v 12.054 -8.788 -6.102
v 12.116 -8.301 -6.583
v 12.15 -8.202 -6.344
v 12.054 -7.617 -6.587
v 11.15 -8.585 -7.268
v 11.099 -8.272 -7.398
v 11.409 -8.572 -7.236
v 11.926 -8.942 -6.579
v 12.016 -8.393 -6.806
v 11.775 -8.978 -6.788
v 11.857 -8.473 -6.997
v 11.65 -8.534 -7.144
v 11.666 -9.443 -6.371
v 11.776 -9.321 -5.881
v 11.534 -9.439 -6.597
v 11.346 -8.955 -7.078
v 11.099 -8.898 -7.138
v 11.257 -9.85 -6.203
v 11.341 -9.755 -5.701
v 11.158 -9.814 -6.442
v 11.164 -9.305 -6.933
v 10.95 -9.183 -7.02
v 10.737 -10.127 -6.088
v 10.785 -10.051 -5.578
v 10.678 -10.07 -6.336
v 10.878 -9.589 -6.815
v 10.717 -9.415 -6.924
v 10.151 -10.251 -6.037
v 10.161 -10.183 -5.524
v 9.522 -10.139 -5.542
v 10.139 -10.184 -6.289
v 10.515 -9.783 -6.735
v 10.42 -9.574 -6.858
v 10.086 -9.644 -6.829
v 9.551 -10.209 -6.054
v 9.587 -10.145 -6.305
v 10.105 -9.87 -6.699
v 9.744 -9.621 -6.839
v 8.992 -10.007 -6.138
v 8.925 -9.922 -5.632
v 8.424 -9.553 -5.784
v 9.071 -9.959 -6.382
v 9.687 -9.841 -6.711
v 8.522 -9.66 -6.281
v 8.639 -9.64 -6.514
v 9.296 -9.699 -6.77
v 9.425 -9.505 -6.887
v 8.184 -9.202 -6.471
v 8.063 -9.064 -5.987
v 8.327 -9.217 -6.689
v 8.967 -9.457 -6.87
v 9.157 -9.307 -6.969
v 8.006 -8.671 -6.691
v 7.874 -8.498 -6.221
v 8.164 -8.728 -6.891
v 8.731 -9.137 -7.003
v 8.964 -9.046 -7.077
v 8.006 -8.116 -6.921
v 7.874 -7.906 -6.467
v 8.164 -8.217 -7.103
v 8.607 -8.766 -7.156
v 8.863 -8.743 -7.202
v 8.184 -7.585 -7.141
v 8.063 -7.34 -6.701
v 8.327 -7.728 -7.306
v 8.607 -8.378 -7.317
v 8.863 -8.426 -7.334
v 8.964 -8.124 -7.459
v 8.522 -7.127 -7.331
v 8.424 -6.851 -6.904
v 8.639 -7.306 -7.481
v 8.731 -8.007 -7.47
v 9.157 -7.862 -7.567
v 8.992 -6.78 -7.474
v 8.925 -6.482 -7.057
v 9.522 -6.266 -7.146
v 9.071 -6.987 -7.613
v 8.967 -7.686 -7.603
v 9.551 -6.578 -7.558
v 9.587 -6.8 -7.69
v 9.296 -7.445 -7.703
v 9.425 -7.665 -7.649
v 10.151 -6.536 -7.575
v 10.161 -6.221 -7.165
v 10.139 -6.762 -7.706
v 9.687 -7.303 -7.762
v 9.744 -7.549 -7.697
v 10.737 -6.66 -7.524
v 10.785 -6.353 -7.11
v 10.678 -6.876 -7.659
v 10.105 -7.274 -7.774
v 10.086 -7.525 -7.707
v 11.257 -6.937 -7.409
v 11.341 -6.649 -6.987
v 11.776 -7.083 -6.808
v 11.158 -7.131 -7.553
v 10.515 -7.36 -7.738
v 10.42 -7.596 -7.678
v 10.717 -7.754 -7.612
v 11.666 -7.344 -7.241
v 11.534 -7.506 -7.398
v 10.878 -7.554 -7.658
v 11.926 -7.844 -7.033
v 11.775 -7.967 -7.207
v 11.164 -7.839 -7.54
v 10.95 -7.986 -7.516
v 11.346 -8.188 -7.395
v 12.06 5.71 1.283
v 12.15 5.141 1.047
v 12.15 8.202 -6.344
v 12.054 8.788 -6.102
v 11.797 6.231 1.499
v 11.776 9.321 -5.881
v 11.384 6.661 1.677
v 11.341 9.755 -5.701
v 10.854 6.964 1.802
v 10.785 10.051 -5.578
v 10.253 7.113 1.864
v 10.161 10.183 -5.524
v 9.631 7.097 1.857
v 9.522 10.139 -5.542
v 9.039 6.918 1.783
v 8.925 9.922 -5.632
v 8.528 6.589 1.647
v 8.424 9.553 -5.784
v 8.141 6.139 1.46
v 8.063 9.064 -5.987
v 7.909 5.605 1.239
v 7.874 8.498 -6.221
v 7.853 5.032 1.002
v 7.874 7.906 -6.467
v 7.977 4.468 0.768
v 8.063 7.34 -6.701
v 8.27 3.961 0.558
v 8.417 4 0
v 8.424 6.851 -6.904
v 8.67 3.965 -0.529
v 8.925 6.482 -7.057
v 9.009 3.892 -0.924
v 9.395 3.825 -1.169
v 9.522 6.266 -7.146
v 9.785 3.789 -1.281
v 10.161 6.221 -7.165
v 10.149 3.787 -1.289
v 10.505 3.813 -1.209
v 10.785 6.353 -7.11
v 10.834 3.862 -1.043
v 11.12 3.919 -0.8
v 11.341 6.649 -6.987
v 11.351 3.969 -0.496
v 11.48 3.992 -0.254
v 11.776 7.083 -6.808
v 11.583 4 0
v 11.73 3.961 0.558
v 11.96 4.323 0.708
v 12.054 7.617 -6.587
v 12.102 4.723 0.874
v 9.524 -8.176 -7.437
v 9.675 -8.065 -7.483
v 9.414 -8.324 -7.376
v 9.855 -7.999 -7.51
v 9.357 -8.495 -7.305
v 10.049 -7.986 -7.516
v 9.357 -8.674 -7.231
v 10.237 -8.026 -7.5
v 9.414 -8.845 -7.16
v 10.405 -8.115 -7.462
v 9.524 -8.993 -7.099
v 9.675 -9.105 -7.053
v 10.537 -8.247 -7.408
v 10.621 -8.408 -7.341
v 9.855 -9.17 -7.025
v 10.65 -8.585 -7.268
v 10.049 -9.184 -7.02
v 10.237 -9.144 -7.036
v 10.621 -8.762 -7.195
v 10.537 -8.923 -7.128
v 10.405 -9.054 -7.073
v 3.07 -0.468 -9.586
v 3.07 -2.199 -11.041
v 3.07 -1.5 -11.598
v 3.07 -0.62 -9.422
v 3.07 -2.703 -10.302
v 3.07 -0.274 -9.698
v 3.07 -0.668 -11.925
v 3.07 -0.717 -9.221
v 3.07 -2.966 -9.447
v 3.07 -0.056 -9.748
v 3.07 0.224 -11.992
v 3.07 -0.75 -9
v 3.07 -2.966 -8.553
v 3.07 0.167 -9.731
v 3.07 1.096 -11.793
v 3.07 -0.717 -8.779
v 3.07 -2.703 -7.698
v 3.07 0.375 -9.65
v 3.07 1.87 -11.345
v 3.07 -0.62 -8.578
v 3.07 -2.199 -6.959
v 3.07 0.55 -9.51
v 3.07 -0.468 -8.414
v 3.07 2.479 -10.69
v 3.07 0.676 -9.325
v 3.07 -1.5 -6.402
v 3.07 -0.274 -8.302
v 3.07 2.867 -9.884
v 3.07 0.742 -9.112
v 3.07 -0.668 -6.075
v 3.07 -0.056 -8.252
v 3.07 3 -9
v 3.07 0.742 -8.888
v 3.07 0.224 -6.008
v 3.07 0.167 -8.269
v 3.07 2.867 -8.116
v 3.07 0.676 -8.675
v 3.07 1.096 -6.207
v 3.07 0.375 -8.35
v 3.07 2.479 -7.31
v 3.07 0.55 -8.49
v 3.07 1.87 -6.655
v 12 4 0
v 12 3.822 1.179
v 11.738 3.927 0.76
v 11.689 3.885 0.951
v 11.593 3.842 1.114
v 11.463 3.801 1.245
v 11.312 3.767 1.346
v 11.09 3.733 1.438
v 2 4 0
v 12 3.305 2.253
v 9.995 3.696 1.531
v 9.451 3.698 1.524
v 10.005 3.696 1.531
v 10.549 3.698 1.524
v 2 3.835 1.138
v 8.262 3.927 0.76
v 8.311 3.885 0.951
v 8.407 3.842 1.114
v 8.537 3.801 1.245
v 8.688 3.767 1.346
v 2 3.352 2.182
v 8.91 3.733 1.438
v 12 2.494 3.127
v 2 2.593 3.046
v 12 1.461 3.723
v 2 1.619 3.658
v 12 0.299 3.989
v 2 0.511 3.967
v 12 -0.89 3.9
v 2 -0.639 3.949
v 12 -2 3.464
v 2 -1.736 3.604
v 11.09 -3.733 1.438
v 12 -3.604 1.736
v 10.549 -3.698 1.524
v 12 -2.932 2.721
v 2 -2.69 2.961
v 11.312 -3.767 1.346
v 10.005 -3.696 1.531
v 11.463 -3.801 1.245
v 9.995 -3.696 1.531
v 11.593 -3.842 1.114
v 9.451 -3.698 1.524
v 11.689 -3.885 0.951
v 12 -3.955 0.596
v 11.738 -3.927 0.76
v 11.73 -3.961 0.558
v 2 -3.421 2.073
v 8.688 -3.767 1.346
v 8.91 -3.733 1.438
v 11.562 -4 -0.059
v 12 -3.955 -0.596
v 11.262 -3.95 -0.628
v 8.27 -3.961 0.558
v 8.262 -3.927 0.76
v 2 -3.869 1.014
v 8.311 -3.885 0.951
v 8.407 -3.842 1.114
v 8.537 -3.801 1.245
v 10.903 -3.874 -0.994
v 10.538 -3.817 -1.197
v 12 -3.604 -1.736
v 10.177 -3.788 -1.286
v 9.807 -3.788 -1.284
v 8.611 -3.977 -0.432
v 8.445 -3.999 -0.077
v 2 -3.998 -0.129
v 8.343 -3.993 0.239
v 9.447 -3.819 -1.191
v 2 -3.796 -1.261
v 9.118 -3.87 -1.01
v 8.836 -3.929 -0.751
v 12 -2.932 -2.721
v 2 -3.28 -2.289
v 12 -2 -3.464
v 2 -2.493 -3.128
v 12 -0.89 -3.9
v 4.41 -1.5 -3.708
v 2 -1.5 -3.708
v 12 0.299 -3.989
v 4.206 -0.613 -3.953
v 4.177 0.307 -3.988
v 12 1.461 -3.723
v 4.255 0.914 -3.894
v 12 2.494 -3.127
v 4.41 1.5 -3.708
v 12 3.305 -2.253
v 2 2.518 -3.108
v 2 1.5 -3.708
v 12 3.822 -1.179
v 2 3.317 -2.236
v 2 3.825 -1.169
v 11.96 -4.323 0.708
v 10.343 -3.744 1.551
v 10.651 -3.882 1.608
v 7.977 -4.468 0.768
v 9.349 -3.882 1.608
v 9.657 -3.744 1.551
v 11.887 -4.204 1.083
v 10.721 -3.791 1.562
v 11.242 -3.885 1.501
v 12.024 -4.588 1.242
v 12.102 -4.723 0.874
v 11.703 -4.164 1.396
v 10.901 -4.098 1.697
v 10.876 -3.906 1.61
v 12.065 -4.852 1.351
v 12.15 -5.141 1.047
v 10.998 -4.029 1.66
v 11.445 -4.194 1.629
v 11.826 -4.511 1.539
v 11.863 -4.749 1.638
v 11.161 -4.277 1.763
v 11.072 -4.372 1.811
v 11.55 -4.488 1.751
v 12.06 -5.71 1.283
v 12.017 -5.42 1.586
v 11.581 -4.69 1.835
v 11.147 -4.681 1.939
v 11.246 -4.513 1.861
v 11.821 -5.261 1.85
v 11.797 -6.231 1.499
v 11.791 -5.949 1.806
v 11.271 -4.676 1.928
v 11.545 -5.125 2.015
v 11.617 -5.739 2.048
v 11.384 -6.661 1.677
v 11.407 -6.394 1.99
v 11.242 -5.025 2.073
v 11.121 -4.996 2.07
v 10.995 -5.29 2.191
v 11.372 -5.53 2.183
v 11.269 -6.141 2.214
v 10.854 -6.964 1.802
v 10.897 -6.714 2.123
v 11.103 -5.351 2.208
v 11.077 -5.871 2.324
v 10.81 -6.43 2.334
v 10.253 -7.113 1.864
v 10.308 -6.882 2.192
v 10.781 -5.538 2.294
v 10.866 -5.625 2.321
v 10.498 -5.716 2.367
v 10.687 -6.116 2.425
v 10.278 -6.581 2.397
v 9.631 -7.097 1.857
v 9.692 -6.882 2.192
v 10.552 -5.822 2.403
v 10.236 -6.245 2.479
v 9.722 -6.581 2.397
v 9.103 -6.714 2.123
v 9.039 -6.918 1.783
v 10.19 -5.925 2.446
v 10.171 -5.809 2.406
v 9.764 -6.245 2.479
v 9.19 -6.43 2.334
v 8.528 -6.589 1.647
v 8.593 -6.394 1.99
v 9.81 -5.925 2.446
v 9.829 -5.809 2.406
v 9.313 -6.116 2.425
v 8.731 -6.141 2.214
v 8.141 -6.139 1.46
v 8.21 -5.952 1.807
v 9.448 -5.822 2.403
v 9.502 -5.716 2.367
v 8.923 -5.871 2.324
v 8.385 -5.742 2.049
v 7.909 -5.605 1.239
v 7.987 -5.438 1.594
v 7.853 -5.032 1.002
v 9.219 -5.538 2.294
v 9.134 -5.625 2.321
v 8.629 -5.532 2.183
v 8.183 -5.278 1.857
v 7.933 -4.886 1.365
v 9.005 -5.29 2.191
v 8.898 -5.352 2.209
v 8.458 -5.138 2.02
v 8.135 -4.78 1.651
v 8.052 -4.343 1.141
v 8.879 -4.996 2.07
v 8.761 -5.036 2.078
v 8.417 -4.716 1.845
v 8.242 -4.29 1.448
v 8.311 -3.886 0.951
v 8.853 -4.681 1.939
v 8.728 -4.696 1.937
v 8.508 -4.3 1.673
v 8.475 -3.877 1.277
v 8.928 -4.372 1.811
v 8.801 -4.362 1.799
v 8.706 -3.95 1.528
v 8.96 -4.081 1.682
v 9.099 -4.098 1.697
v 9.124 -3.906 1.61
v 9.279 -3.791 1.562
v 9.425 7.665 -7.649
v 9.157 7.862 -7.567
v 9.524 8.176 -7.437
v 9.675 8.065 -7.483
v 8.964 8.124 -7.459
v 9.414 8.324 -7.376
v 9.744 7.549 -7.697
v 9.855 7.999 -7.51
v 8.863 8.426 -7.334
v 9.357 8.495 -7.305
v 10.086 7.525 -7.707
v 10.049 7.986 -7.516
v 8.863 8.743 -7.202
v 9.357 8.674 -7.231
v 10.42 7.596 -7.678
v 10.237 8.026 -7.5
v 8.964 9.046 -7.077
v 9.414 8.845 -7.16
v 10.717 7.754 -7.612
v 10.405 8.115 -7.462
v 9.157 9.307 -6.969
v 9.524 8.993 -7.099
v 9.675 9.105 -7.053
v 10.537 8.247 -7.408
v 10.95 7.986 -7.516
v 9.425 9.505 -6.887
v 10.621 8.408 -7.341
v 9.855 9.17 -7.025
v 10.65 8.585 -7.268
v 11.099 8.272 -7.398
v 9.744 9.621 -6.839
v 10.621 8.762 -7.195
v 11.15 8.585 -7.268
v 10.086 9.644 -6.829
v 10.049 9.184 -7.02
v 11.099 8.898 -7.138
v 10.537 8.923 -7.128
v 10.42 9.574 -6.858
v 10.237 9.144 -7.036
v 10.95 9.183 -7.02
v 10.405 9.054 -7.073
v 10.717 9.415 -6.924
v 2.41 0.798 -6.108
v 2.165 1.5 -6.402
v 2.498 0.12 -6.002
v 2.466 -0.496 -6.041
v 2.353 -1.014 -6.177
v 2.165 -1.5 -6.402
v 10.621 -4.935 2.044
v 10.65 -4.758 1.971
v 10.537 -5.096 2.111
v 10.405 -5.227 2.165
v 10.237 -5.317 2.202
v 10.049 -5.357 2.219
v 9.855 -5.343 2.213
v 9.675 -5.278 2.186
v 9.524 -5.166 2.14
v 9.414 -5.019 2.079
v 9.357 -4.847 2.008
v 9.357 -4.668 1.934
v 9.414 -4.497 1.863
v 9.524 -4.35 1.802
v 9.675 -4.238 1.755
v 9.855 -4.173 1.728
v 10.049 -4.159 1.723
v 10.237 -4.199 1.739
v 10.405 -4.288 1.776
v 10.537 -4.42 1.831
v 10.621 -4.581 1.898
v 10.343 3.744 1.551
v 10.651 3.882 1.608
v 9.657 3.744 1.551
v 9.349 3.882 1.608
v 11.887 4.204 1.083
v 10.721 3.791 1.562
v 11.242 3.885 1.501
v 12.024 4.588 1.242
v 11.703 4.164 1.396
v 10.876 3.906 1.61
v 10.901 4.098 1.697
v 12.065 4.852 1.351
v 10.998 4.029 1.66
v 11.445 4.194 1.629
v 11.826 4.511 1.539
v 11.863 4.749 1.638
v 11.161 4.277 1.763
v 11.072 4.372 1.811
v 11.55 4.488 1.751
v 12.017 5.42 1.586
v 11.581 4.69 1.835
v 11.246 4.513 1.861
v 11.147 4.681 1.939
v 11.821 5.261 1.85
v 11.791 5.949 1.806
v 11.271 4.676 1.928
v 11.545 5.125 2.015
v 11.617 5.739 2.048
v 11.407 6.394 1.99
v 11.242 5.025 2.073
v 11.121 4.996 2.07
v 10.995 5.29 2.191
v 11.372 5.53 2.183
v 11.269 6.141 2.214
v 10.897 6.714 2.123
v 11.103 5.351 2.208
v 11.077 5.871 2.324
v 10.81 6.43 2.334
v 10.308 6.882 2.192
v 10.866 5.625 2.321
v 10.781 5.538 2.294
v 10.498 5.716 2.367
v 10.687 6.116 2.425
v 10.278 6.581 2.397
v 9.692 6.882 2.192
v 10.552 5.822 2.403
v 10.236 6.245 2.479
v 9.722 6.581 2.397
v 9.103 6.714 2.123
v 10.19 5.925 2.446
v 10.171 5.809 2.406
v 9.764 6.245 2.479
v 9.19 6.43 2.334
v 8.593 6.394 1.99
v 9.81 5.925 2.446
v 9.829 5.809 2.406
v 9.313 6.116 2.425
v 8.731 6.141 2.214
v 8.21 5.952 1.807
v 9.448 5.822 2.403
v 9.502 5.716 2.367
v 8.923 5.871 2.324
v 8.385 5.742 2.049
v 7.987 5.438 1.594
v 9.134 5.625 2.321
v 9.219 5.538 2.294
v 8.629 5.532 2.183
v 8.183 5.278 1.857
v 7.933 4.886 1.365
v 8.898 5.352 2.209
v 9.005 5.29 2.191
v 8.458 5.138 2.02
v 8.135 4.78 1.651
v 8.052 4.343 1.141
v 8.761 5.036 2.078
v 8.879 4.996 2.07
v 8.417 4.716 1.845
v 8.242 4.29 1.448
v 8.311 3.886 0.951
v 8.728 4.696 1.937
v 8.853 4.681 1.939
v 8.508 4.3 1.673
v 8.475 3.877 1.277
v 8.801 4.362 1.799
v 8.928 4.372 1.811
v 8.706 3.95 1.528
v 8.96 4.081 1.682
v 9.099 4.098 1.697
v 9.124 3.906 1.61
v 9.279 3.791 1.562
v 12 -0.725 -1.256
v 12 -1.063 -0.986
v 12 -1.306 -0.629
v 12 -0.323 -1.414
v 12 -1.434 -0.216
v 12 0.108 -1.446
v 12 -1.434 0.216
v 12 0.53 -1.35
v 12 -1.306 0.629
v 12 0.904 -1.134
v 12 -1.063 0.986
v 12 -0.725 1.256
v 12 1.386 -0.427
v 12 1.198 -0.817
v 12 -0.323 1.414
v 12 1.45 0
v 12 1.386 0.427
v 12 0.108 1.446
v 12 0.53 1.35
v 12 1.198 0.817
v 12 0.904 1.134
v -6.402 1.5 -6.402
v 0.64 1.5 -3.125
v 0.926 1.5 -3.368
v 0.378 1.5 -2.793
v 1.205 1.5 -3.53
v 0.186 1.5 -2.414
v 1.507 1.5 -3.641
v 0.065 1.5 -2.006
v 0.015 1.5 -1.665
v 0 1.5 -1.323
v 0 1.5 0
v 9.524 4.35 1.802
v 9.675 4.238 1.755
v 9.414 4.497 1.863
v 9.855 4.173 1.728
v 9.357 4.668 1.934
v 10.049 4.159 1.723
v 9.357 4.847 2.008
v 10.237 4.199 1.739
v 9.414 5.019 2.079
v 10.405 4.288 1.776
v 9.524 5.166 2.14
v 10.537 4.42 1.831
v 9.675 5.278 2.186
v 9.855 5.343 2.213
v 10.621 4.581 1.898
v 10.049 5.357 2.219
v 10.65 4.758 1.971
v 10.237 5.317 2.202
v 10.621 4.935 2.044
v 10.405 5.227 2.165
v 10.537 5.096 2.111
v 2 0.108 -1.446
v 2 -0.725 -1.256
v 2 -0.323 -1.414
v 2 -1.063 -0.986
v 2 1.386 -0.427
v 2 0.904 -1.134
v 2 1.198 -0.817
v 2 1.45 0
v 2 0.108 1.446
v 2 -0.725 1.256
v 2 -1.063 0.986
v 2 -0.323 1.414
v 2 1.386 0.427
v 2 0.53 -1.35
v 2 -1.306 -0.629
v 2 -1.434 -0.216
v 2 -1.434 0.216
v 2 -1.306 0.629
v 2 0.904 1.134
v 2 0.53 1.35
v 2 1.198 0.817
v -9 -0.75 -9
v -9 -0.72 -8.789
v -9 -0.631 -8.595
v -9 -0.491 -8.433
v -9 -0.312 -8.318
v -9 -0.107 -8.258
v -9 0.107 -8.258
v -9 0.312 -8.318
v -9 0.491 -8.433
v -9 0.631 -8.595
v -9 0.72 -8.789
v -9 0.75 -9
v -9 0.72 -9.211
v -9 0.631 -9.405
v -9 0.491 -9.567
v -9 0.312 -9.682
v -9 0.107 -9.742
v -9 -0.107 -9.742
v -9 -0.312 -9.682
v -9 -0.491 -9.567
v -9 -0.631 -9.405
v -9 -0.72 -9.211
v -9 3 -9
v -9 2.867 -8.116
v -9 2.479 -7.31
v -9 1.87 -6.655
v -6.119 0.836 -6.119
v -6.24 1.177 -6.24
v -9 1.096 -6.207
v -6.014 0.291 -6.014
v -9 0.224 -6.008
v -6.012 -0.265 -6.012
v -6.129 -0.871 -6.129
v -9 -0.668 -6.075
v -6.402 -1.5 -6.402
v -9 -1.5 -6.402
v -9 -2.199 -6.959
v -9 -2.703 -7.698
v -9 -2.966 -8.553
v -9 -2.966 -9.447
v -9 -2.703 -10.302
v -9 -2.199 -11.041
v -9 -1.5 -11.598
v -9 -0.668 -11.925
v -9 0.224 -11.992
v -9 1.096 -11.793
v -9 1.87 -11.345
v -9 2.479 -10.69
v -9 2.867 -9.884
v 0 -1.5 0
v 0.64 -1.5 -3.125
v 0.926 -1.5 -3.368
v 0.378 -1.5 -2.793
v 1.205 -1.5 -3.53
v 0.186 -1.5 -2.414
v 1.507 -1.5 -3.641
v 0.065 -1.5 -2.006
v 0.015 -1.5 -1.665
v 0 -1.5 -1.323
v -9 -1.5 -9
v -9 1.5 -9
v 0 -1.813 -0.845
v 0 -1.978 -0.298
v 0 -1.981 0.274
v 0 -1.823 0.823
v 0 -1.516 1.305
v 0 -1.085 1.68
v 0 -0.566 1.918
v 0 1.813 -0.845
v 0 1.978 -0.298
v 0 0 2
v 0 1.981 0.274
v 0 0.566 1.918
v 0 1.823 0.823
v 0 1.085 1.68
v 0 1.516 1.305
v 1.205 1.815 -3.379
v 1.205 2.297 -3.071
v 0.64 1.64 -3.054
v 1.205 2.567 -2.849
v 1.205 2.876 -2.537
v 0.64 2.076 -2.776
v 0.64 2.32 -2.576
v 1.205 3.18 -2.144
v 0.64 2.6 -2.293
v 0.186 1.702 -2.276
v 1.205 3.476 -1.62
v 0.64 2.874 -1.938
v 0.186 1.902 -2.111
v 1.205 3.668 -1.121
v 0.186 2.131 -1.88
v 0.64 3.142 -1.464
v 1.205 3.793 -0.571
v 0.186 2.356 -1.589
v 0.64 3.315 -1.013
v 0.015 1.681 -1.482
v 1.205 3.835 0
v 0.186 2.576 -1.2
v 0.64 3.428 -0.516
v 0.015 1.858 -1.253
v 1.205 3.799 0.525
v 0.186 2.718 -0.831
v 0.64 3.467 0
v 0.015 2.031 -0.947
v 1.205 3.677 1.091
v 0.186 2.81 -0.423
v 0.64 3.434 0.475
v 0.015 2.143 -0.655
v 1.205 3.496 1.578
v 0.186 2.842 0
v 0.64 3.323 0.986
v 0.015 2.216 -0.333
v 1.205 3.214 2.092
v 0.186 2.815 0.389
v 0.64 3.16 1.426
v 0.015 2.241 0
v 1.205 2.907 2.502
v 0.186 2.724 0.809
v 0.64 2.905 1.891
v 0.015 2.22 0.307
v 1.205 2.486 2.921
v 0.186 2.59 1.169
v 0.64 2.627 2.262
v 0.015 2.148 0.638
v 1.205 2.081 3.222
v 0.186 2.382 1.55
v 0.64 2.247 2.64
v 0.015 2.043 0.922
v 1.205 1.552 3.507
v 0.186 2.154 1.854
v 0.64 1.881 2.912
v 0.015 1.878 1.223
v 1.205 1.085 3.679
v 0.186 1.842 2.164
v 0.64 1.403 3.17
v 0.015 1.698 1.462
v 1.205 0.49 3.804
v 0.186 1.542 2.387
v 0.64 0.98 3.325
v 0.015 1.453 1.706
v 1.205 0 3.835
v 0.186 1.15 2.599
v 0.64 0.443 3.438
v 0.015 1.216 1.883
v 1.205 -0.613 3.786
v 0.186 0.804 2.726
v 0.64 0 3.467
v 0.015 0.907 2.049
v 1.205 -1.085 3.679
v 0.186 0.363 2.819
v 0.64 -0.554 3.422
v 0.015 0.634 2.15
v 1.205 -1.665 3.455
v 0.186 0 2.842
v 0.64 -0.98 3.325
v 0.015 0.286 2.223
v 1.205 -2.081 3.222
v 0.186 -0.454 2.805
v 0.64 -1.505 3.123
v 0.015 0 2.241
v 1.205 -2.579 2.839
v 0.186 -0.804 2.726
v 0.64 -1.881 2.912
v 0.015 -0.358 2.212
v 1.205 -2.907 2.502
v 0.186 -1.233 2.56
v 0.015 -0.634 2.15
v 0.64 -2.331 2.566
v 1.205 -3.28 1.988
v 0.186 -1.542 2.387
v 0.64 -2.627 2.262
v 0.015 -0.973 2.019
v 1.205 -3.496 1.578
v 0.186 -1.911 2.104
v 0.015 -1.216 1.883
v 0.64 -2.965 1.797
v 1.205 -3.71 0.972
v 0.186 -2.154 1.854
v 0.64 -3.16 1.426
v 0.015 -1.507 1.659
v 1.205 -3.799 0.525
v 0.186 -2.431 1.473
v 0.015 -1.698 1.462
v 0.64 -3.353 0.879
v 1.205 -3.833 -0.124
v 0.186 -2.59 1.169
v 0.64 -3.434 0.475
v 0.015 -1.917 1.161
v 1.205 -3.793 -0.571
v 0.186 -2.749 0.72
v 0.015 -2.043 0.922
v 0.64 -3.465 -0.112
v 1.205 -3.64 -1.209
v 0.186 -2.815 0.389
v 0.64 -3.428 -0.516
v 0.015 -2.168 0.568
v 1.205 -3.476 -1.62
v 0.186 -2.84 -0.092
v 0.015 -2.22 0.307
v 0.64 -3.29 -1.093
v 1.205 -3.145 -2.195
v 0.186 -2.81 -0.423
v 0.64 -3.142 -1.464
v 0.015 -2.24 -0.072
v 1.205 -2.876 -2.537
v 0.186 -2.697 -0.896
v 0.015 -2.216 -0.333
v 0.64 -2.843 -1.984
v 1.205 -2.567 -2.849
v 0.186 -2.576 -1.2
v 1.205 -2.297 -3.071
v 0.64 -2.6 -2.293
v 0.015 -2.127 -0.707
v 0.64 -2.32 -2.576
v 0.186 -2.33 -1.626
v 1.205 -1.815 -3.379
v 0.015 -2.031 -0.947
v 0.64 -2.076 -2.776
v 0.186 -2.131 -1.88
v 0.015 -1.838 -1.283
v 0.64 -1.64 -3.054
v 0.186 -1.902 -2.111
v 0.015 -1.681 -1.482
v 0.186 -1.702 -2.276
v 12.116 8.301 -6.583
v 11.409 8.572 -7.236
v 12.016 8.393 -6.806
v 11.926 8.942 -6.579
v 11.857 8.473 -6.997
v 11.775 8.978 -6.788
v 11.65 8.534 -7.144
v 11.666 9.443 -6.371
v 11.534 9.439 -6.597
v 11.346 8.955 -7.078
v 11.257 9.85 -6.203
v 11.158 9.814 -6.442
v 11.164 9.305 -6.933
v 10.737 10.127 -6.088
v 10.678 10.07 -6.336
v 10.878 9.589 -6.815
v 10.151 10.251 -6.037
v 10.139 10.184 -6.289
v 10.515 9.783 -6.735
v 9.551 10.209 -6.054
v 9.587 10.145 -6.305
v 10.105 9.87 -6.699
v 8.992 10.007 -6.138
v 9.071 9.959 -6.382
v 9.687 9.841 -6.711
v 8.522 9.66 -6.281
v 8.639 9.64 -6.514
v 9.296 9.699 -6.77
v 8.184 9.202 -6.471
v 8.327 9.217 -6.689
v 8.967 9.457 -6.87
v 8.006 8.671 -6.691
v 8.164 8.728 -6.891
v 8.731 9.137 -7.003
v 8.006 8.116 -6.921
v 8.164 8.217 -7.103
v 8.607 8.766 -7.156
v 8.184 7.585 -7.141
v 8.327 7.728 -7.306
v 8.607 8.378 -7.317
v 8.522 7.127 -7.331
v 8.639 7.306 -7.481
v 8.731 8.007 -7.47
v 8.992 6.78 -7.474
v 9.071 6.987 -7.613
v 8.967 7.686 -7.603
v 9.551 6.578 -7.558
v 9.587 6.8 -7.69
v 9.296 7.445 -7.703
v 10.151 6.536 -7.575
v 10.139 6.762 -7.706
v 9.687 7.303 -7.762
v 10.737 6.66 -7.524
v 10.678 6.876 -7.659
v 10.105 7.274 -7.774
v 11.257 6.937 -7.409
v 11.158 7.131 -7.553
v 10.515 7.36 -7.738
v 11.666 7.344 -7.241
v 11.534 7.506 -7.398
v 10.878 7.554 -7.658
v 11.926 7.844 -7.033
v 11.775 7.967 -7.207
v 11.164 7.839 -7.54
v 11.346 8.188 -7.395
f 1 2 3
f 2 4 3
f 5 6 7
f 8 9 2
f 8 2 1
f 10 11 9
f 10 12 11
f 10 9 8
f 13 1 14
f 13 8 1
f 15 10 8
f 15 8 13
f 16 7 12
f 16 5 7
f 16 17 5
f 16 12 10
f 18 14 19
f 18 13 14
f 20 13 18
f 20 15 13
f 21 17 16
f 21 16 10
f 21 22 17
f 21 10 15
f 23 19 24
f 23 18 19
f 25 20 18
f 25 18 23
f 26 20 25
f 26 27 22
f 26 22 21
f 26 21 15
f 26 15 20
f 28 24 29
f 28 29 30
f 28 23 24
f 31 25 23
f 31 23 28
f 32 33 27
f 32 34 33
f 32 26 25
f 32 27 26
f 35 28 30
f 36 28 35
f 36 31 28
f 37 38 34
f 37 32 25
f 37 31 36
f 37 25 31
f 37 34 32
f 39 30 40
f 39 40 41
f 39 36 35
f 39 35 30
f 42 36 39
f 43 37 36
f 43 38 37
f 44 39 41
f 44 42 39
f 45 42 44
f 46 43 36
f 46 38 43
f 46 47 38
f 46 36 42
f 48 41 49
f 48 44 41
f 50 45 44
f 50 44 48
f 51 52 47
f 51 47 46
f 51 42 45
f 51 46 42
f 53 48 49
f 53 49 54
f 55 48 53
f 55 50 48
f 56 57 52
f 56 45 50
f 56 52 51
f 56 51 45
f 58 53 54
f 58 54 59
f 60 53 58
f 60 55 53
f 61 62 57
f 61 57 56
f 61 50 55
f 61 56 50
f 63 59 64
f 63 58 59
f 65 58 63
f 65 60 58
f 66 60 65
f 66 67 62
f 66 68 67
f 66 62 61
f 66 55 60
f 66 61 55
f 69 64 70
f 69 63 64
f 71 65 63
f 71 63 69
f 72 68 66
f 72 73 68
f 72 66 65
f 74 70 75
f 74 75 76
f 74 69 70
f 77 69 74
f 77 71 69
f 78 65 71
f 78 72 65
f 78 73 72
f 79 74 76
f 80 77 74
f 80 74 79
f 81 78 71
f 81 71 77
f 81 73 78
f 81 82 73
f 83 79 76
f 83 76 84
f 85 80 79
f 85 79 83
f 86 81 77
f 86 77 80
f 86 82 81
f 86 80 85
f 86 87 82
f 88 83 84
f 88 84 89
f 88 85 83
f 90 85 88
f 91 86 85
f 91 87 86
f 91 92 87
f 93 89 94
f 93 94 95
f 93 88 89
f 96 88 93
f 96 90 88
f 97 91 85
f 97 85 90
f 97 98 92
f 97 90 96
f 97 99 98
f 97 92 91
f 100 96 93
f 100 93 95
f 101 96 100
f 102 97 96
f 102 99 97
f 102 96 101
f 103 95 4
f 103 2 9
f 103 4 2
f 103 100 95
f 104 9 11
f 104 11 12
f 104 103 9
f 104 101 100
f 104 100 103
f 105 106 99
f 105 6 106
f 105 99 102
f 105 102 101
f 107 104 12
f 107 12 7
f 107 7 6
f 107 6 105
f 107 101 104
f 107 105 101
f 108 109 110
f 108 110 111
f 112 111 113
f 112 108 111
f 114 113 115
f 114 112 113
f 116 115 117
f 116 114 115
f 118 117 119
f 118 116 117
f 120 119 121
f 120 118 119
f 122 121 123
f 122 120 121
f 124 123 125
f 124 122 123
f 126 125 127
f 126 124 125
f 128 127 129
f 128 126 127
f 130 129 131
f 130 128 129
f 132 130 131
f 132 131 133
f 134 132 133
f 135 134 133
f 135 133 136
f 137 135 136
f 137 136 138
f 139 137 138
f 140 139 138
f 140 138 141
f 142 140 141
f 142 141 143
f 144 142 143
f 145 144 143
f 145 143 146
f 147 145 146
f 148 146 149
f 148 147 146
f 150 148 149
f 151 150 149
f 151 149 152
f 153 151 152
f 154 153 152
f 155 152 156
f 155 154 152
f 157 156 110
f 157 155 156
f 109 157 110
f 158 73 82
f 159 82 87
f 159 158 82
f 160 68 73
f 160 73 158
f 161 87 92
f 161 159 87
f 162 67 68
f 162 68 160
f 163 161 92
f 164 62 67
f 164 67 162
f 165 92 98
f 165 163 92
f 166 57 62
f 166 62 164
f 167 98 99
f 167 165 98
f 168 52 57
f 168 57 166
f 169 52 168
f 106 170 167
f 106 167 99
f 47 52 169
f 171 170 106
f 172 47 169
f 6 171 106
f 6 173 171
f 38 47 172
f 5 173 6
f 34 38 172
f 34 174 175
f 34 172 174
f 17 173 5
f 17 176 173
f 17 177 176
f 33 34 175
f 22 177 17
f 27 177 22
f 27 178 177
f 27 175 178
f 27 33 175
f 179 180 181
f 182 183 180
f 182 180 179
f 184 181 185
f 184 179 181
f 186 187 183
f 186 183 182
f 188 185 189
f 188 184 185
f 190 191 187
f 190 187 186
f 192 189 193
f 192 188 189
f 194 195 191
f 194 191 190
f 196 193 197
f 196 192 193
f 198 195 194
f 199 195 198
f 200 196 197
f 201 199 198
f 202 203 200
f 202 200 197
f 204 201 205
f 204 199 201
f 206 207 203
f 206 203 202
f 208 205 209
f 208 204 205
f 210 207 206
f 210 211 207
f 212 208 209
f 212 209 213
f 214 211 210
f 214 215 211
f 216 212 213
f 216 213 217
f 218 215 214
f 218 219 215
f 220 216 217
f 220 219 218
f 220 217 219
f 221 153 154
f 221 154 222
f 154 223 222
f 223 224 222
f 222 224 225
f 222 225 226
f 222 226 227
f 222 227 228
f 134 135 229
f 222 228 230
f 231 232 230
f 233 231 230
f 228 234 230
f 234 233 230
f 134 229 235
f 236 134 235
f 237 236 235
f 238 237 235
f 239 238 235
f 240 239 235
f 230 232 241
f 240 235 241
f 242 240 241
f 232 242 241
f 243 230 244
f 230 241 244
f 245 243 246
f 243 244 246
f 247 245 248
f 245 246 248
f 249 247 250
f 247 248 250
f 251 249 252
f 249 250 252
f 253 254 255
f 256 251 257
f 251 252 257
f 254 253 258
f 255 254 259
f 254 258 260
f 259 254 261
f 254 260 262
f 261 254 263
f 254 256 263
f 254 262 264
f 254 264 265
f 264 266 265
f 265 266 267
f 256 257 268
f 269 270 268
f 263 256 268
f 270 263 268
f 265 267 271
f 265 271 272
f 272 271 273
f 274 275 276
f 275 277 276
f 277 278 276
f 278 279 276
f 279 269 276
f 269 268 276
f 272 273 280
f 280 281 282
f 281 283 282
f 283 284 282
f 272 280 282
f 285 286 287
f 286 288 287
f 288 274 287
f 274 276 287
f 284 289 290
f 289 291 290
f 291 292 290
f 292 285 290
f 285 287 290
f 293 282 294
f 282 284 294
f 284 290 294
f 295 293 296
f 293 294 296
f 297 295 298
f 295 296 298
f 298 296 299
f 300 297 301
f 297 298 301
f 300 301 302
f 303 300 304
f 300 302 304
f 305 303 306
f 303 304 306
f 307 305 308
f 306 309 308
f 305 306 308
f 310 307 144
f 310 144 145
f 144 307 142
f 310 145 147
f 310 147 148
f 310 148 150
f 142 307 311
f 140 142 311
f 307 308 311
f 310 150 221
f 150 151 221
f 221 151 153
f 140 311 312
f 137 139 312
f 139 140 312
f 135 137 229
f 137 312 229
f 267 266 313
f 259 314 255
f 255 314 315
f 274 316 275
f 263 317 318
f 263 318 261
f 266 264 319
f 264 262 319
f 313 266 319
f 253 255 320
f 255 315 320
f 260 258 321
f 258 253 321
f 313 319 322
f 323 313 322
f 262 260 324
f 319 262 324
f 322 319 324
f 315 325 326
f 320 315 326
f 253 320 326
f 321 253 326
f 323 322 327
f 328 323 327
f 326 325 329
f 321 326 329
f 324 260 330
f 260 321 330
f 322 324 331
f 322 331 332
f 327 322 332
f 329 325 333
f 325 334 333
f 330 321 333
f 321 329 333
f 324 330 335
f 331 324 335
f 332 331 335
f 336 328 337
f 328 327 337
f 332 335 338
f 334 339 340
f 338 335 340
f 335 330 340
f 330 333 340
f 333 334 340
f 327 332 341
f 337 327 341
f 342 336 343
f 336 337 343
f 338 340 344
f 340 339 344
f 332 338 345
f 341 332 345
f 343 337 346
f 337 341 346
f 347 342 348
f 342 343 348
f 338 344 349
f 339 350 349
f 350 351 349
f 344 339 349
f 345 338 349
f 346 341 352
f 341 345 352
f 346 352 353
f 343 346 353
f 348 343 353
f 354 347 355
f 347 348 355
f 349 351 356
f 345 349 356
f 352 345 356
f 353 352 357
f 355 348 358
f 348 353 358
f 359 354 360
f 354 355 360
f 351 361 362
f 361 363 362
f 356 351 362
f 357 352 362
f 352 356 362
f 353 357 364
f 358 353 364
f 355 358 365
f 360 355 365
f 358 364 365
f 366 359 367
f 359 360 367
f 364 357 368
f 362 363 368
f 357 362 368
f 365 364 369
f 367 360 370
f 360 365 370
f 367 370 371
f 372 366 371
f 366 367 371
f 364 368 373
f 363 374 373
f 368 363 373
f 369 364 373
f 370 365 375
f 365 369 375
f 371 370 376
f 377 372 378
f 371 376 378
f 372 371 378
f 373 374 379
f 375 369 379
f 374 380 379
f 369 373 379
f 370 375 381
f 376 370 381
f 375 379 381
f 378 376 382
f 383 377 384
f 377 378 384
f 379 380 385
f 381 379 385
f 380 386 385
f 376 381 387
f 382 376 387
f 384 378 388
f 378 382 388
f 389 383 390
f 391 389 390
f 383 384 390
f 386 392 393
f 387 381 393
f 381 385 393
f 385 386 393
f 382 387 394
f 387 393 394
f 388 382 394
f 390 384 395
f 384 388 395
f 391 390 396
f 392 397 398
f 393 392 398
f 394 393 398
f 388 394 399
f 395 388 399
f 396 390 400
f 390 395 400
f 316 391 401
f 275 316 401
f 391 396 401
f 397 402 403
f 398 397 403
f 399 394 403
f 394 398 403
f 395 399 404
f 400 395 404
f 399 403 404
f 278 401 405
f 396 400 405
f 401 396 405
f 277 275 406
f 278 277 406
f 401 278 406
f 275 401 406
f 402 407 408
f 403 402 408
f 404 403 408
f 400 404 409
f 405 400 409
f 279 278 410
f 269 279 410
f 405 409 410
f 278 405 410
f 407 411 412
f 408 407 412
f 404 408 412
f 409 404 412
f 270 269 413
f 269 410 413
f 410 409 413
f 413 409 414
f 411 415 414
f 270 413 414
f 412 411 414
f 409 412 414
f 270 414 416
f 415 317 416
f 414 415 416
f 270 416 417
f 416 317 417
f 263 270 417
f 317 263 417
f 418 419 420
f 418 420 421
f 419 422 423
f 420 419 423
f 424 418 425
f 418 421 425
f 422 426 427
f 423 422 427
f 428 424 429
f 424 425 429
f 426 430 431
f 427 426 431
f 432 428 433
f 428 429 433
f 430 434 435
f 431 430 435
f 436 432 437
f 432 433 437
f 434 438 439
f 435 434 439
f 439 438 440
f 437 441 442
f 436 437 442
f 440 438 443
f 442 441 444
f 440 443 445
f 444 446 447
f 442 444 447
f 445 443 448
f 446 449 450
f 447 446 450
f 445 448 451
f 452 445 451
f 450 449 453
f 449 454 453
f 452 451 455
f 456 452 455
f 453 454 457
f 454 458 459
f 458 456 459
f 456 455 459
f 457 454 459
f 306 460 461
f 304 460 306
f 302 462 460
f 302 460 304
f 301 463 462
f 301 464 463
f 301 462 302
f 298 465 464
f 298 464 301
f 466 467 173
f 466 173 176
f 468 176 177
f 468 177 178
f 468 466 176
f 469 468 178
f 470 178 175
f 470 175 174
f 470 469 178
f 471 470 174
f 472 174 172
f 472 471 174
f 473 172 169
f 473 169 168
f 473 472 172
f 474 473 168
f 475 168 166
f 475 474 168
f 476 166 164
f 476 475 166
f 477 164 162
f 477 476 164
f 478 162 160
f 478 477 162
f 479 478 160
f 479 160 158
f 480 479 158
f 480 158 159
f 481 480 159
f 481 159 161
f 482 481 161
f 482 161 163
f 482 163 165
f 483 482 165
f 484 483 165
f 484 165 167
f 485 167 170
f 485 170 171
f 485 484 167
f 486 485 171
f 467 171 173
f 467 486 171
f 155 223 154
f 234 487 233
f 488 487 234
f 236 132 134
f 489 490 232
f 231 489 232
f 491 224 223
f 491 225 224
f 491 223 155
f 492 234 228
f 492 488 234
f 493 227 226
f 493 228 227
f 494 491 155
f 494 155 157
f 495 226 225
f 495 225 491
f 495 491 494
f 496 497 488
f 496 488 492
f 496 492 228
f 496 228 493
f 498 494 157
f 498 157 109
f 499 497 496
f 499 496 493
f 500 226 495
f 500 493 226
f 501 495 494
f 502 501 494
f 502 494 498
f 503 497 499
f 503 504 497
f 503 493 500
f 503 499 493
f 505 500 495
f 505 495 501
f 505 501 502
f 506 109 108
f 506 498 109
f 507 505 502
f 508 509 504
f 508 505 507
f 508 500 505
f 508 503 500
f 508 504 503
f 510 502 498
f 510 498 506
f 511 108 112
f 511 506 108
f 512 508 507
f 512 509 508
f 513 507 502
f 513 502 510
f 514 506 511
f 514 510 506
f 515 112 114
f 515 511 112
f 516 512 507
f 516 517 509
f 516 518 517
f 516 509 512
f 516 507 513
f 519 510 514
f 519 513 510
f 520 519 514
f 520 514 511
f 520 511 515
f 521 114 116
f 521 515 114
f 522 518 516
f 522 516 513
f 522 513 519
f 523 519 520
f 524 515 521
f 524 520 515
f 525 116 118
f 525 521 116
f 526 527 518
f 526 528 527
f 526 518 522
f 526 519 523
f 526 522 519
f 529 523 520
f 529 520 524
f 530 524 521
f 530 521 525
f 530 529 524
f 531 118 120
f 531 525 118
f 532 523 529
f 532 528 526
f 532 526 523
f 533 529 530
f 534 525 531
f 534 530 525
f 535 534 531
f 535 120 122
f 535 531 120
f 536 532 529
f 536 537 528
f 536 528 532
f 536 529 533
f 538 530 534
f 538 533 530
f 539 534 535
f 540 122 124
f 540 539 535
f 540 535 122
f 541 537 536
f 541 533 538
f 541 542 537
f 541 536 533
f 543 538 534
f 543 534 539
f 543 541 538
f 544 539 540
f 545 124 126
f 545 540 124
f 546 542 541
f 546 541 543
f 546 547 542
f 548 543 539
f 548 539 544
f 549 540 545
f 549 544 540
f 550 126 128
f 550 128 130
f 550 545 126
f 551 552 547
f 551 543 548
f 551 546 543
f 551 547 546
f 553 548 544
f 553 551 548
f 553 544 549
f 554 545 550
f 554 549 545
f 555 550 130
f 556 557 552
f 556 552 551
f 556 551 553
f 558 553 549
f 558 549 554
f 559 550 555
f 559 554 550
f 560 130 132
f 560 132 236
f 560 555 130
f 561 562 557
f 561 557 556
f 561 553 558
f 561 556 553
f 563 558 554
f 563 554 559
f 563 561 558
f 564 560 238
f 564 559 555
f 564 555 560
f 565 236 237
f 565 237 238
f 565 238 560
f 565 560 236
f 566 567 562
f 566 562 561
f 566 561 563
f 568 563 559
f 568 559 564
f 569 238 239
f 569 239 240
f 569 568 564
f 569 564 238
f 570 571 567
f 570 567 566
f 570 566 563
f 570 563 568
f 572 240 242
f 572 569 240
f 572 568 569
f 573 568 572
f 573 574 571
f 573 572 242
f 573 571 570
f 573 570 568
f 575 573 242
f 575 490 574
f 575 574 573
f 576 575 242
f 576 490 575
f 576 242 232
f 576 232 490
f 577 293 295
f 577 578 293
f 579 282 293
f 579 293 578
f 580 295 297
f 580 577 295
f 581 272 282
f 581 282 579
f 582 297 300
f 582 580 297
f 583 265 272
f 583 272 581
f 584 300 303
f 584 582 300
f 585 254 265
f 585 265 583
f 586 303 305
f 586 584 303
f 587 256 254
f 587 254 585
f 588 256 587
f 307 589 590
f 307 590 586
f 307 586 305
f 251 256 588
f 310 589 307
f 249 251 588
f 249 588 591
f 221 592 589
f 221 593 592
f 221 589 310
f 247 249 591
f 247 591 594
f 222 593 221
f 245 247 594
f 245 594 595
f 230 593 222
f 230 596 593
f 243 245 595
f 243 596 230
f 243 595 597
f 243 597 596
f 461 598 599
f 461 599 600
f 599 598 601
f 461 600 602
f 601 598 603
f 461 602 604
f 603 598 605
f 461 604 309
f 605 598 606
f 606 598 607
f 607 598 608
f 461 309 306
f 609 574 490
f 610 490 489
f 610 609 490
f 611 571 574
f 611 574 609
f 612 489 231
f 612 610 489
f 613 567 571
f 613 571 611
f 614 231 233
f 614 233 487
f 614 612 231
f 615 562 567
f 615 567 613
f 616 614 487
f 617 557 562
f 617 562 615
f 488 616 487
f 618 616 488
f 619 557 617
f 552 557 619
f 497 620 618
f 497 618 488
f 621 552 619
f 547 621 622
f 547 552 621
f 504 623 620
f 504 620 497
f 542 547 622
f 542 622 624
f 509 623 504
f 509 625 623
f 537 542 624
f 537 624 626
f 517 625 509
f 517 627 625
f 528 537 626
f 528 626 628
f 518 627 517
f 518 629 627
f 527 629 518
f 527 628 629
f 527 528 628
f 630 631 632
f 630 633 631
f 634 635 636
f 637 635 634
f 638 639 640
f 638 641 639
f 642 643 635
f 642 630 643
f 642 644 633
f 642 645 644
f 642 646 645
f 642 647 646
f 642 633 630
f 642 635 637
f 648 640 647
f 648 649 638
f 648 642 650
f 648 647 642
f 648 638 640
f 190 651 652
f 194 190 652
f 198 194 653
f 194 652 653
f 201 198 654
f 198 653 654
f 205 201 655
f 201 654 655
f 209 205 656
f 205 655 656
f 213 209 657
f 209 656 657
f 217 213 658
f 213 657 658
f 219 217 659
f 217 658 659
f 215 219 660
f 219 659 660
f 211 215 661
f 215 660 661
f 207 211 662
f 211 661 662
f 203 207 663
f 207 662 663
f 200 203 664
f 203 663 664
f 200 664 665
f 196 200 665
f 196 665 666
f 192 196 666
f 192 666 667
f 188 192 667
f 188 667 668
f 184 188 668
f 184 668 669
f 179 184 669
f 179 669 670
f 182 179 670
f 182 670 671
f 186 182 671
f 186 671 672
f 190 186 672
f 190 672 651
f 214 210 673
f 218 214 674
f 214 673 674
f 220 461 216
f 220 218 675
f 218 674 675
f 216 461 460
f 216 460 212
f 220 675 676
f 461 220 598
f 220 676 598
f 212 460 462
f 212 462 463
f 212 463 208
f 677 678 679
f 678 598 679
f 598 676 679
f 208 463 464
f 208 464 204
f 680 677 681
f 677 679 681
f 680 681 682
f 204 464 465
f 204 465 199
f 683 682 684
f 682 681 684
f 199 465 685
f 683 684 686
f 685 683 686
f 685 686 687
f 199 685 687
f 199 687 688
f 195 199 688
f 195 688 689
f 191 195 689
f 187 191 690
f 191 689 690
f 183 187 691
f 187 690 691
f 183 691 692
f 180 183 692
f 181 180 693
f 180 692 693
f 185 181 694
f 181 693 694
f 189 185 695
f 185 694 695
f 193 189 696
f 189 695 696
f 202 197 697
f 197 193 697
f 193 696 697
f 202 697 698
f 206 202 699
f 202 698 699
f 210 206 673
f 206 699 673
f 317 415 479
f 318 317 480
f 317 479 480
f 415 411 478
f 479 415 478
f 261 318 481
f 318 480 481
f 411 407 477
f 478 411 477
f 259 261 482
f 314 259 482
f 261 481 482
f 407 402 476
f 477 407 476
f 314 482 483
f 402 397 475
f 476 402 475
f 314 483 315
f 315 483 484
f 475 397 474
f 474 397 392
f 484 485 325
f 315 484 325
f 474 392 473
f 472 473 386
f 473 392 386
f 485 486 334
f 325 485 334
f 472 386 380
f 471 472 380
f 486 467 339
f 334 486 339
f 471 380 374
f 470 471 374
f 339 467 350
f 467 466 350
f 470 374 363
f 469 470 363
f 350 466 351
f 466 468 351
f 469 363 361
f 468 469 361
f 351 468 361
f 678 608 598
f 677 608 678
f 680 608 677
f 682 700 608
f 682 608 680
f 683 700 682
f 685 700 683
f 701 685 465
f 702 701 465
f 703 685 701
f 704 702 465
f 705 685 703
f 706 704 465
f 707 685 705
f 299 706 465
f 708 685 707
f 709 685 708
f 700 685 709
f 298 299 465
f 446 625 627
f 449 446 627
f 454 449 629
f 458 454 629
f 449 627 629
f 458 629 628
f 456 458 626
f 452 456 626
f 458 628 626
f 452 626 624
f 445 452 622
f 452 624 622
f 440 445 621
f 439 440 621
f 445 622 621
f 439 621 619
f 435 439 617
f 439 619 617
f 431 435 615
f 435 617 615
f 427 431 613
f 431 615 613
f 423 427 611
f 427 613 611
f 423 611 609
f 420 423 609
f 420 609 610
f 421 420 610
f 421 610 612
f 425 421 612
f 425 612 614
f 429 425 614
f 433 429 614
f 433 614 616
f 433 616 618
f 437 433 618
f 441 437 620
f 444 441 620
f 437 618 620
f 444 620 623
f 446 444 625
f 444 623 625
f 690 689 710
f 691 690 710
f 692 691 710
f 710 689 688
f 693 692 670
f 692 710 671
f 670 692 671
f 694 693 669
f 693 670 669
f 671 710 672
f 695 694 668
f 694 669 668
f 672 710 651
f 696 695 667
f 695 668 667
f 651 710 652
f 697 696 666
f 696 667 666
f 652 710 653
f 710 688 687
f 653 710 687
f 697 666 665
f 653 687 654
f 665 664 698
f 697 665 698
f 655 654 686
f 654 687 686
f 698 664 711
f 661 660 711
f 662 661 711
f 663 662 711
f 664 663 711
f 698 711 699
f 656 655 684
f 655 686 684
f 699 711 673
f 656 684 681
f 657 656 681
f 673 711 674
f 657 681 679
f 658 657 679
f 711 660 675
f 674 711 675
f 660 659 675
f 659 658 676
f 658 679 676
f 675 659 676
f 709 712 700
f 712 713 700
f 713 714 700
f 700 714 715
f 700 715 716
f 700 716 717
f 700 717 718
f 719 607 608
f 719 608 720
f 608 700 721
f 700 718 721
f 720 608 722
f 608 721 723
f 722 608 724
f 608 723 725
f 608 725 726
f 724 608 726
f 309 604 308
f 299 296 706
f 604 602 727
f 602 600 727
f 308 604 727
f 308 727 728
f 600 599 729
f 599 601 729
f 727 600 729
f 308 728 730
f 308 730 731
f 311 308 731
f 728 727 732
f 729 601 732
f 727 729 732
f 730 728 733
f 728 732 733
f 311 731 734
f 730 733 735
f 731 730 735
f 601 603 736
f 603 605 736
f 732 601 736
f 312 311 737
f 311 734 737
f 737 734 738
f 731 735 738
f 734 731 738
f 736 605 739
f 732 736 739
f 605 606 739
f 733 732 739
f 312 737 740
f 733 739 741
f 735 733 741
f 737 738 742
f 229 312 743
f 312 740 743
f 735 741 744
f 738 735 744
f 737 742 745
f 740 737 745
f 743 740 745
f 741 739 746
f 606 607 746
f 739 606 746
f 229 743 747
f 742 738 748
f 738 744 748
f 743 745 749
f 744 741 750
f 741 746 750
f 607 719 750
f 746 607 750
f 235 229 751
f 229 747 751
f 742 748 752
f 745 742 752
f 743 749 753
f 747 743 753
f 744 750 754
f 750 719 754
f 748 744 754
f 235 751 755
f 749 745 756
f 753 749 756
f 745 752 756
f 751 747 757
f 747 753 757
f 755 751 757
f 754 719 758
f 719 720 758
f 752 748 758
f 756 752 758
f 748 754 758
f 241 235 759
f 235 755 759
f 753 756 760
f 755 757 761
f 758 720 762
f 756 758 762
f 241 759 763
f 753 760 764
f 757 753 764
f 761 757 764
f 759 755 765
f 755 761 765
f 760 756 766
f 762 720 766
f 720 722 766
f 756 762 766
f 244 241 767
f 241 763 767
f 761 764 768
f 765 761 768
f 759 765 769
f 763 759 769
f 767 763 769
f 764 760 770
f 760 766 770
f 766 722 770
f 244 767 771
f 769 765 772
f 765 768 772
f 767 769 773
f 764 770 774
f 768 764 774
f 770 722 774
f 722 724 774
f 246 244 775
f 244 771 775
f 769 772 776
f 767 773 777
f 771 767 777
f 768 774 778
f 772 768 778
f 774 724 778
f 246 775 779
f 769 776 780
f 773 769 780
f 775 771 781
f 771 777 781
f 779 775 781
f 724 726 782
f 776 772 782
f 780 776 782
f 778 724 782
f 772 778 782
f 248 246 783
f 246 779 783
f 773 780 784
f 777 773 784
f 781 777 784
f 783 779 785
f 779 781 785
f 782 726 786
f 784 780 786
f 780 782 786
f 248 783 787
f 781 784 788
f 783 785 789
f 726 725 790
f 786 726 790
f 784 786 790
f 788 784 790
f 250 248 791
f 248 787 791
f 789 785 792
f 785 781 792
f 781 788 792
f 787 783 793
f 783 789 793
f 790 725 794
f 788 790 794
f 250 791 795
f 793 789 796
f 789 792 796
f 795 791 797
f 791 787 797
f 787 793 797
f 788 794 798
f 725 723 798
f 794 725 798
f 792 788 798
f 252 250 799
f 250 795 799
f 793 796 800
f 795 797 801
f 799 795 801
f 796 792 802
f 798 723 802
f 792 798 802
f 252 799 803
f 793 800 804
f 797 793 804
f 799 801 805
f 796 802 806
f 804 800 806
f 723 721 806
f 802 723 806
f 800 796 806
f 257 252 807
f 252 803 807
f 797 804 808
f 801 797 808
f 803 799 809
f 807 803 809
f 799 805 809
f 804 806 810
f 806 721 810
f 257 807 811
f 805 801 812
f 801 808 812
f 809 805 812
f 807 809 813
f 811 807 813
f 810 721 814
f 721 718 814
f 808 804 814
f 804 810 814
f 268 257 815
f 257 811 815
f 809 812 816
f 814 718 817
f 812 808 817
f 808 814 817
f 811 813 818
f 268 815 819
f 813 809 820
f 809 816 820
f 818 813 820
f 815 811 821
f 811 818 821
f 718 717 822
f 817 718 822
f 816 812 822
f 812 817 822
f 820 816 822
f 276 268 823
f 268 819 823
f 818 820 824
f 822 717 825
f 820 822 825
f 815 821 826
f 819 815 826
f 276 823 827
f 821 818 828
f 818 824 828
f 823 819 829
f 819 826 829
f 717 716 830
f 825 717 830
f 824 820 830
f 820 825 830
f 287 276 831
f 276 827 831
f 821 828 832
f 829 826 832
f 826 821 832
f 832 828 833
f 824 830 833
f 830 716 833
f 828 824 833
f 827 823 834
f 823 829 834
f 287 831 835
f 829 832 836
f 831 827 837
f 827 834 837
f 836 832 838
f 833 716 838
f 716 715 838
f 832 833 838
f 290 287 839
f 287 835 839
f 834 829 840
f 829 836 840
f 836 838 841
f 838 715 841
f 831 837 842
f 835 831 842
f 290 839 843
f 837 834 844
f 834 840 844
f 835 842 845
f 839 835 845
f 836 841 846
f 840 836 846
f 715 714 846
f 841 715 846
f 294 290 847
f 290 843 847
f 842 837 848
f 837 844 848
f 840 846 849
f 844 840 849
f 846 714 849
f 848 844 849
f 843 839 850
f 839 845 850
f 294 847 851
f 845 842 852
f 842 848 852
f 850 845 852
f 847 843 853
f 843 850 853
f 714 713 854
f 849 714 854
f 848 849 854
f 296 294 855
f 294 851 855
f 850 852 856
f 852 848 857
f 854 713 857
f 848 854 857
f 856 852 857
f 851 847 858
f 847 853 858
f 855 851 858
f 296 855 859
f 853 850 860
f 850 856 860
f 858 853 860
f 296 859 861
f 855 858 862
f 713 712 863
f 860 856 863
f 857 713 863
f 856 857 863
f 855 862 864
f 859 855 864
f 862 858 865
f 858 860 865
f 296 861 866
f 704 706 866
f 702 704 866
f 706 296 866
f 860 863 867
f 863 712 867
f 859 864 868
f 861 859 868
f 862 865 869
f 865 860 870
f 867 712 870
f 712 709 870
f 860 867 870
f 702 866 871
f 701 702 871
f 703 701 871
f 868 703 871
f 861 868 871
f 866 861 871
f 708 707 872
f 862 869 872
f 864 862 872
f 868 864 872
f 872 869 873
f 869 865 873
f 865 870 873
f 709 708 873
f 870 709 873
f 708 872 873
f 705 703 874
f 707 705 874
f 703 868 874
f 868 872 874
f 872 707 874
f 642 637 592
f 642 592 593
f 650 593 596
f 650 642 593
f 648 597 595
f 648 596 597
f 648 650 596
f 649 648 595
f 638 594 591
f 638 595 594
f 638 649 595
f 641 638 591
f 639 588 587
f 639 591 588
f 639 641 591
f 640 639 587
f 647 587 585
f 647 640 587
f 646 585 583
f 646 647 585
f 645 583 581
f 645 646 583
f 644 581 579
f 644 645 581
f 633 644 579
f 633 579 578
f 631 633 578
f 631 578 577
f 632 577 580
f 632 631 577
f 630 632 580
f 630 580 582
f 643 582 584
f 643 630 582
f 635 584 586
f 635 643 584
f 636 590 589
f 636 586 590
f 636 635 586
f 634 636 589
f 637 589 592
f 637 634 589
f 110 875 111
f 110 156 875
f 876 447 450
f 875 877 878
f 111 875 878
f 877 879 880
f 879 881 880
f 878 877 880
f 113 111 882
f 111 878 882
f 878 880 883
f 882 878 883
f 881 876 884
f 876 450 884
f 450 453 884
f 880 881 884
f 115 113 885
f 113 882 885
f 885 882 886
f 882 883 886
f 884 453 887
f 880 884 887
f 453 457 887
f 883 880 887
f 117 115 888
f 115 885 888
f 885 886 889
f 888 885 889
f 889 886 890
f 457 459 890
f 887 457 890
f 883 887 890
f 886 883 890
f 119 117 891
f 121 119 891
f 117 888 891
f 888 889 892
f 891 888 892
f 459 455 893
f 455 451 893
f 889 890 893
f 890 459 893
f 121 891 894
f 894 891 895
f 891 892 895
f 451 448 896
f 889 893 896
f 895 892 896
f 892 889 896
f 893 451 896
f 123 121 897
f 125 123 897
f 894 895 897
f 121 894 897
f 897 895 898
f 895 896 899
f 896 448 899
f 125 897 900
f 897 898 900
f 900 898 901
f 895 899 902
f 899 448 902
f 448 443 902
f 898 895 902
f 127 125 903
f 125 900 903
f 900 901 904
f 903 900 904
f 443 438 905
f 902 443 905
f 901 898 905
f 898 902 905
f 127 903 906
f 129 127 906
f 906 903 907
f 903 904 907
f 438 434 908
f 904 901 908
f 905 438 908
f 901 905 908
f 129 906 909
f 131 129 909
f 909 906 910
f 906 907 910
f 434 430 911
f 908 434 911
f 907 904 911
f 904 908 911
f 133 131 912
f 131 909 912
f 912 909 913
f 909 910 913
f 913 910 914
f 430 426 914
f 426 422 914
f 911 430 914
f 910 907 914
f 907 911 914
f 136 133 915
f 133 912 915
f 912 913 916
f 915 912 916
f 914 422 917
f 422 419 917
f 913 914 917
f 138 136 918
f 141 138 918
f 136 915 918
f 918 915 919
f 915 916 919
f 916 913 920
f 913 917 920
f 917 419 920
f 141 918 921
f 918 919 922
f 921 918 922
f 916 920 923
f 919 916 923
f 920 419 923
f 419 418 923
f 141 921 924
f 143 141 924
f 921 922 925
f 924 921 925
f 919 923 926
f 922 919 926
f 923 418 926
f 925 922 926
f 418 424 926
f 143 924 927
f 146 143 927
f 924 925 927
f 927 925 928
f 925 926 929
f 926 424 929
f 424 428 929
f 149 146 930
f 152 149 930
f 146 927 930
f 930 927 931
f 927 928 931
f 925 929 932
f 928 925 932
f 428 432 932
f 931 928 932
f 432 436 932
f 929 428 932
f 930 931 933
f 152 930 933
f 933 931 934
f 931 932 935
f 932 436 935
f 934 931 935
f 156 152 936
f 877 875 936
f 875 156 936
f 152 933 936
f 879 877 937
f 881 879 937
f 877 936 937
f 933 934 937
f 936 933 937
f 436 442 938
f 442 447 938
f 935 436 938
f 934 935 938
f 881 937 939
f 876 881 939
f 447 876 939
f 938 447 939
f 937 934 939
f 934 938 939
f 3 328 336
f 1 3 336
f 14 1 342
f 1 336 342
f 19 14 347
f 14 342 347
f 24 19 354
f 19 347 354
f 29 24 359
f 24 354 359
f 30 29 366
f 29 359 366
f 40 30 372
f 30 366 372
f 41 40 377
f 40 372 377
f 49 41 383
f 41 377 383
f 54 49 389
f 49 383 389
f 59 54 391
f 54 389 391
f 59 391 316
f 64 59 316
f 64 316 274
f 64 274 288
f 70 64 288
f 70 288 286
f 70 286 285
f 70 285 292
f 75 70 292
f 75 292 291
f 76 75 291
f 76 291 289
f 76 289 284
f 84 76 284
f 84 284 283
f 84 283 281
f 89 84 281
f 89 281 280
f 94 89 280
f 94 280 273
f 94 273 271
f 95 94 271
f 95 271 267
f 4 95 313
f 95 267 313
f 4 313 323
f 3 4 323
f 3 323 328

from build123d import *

# Parameters (mm, degrees)
F0_R      = 4
F1_DEPTH  = 2
F2_R      = 4
F2_R_2    = 1.45
F3_DEPTH  = 10
F5_DEPTH  = 1.5
F8_R      = 3
F9_DEPTH  = 12.07
F10_R     = 0.75
F11_DEPTH = 25
F13_R     = 2
F14_R     = 2.15
F14_R_2   = 0.65
F15_DEPTH = 10
F16_R     = 0.99999


# Not quite as in the source:
# - a fillet or chamfer is up to 0.001 mm smaller than in the source, because OpenCascade refuses the exact size


with BuildPart() as f1:
    # F0 (on Right) → F1 (new body)
    with BuildSketch(Plane.YZ):
        Circle(F0_R)
    extrude(amount=F1_DEPTH)

    # F2 (on face) → F3 (join)
    with BuildSketch(Plane.YZ.offset(2)):
        Circle(F2_R)
        Circle(F2_R_2, mode=Mode.SUBTRACT)
    extrude(amount=F3_DEPTH)

    # F4 (on Front) → F5 (join, symmetric)
    with BuildSketch(Plane.XZ):
        Polygon((0, -3), (0, 0), (-9, -9), (0, -9), (5, -3), align=None)
    extrude(amount=F5_DEPTH, both=True)

    # F8 (on plane+point) → F9 (join)
    with BuildSketch(Plane.YZ.offset(-9)):
        with Locations((0, -9)):
            Circle(F8_R)
    extrude(amount=F9_DEPTH)

    # F10 (on face) → F11 (cut)
    with BuildSketch(Plane(origin=(-9, 0, 0), x_dir=(0, -1, 0), z_dir=(-1, 0, 0))):
        with Locations((0, -9)):
            Circle(F10_R)
    extrude(amount=-F11_DEPTH, mode=Mode.SUBTRACT)

    # F13
    f13_edges = [f1.edges().sort_by_distance(p)[0] for p in [
        (0, -2.236068, 3.316625),
    ]]
    fillet(f13_edges, radius=F13_R)

    # F14 (on face) → F15 (join)
    with BuildSketch(Plane(origin=(0, 0, 0), x_dir=(1, 0, 0), z_dir=(0, -0.3826834324, -0.9238795325))):
        with Locations((10, 5.15)):
            Circle(F14_R)
        with Locations((10, 5.15)):
            Circle(F14_R_2, mode=Mode.SUBTRACT)
    extrude(amount=F15_DEPTH)

    # F16 (radius 1 in the source; OpenCascade refuses exactly that, so slightly less here)
    f16_edges = [f1.edges().sort_by_distance(p)[0] for p in [
        (7.85, -8.584814, -7.267976),
        (9.401322, -6.665759, 2.761048),
    ]]
    fillet(f16_edges, radius=F16_R)

    # F17: F1 across plane


with BuildPart() as f1_1:
    add(f1.part)
    add(f1.part.mirror(Plane.XZ))


solid = f1_1.part
